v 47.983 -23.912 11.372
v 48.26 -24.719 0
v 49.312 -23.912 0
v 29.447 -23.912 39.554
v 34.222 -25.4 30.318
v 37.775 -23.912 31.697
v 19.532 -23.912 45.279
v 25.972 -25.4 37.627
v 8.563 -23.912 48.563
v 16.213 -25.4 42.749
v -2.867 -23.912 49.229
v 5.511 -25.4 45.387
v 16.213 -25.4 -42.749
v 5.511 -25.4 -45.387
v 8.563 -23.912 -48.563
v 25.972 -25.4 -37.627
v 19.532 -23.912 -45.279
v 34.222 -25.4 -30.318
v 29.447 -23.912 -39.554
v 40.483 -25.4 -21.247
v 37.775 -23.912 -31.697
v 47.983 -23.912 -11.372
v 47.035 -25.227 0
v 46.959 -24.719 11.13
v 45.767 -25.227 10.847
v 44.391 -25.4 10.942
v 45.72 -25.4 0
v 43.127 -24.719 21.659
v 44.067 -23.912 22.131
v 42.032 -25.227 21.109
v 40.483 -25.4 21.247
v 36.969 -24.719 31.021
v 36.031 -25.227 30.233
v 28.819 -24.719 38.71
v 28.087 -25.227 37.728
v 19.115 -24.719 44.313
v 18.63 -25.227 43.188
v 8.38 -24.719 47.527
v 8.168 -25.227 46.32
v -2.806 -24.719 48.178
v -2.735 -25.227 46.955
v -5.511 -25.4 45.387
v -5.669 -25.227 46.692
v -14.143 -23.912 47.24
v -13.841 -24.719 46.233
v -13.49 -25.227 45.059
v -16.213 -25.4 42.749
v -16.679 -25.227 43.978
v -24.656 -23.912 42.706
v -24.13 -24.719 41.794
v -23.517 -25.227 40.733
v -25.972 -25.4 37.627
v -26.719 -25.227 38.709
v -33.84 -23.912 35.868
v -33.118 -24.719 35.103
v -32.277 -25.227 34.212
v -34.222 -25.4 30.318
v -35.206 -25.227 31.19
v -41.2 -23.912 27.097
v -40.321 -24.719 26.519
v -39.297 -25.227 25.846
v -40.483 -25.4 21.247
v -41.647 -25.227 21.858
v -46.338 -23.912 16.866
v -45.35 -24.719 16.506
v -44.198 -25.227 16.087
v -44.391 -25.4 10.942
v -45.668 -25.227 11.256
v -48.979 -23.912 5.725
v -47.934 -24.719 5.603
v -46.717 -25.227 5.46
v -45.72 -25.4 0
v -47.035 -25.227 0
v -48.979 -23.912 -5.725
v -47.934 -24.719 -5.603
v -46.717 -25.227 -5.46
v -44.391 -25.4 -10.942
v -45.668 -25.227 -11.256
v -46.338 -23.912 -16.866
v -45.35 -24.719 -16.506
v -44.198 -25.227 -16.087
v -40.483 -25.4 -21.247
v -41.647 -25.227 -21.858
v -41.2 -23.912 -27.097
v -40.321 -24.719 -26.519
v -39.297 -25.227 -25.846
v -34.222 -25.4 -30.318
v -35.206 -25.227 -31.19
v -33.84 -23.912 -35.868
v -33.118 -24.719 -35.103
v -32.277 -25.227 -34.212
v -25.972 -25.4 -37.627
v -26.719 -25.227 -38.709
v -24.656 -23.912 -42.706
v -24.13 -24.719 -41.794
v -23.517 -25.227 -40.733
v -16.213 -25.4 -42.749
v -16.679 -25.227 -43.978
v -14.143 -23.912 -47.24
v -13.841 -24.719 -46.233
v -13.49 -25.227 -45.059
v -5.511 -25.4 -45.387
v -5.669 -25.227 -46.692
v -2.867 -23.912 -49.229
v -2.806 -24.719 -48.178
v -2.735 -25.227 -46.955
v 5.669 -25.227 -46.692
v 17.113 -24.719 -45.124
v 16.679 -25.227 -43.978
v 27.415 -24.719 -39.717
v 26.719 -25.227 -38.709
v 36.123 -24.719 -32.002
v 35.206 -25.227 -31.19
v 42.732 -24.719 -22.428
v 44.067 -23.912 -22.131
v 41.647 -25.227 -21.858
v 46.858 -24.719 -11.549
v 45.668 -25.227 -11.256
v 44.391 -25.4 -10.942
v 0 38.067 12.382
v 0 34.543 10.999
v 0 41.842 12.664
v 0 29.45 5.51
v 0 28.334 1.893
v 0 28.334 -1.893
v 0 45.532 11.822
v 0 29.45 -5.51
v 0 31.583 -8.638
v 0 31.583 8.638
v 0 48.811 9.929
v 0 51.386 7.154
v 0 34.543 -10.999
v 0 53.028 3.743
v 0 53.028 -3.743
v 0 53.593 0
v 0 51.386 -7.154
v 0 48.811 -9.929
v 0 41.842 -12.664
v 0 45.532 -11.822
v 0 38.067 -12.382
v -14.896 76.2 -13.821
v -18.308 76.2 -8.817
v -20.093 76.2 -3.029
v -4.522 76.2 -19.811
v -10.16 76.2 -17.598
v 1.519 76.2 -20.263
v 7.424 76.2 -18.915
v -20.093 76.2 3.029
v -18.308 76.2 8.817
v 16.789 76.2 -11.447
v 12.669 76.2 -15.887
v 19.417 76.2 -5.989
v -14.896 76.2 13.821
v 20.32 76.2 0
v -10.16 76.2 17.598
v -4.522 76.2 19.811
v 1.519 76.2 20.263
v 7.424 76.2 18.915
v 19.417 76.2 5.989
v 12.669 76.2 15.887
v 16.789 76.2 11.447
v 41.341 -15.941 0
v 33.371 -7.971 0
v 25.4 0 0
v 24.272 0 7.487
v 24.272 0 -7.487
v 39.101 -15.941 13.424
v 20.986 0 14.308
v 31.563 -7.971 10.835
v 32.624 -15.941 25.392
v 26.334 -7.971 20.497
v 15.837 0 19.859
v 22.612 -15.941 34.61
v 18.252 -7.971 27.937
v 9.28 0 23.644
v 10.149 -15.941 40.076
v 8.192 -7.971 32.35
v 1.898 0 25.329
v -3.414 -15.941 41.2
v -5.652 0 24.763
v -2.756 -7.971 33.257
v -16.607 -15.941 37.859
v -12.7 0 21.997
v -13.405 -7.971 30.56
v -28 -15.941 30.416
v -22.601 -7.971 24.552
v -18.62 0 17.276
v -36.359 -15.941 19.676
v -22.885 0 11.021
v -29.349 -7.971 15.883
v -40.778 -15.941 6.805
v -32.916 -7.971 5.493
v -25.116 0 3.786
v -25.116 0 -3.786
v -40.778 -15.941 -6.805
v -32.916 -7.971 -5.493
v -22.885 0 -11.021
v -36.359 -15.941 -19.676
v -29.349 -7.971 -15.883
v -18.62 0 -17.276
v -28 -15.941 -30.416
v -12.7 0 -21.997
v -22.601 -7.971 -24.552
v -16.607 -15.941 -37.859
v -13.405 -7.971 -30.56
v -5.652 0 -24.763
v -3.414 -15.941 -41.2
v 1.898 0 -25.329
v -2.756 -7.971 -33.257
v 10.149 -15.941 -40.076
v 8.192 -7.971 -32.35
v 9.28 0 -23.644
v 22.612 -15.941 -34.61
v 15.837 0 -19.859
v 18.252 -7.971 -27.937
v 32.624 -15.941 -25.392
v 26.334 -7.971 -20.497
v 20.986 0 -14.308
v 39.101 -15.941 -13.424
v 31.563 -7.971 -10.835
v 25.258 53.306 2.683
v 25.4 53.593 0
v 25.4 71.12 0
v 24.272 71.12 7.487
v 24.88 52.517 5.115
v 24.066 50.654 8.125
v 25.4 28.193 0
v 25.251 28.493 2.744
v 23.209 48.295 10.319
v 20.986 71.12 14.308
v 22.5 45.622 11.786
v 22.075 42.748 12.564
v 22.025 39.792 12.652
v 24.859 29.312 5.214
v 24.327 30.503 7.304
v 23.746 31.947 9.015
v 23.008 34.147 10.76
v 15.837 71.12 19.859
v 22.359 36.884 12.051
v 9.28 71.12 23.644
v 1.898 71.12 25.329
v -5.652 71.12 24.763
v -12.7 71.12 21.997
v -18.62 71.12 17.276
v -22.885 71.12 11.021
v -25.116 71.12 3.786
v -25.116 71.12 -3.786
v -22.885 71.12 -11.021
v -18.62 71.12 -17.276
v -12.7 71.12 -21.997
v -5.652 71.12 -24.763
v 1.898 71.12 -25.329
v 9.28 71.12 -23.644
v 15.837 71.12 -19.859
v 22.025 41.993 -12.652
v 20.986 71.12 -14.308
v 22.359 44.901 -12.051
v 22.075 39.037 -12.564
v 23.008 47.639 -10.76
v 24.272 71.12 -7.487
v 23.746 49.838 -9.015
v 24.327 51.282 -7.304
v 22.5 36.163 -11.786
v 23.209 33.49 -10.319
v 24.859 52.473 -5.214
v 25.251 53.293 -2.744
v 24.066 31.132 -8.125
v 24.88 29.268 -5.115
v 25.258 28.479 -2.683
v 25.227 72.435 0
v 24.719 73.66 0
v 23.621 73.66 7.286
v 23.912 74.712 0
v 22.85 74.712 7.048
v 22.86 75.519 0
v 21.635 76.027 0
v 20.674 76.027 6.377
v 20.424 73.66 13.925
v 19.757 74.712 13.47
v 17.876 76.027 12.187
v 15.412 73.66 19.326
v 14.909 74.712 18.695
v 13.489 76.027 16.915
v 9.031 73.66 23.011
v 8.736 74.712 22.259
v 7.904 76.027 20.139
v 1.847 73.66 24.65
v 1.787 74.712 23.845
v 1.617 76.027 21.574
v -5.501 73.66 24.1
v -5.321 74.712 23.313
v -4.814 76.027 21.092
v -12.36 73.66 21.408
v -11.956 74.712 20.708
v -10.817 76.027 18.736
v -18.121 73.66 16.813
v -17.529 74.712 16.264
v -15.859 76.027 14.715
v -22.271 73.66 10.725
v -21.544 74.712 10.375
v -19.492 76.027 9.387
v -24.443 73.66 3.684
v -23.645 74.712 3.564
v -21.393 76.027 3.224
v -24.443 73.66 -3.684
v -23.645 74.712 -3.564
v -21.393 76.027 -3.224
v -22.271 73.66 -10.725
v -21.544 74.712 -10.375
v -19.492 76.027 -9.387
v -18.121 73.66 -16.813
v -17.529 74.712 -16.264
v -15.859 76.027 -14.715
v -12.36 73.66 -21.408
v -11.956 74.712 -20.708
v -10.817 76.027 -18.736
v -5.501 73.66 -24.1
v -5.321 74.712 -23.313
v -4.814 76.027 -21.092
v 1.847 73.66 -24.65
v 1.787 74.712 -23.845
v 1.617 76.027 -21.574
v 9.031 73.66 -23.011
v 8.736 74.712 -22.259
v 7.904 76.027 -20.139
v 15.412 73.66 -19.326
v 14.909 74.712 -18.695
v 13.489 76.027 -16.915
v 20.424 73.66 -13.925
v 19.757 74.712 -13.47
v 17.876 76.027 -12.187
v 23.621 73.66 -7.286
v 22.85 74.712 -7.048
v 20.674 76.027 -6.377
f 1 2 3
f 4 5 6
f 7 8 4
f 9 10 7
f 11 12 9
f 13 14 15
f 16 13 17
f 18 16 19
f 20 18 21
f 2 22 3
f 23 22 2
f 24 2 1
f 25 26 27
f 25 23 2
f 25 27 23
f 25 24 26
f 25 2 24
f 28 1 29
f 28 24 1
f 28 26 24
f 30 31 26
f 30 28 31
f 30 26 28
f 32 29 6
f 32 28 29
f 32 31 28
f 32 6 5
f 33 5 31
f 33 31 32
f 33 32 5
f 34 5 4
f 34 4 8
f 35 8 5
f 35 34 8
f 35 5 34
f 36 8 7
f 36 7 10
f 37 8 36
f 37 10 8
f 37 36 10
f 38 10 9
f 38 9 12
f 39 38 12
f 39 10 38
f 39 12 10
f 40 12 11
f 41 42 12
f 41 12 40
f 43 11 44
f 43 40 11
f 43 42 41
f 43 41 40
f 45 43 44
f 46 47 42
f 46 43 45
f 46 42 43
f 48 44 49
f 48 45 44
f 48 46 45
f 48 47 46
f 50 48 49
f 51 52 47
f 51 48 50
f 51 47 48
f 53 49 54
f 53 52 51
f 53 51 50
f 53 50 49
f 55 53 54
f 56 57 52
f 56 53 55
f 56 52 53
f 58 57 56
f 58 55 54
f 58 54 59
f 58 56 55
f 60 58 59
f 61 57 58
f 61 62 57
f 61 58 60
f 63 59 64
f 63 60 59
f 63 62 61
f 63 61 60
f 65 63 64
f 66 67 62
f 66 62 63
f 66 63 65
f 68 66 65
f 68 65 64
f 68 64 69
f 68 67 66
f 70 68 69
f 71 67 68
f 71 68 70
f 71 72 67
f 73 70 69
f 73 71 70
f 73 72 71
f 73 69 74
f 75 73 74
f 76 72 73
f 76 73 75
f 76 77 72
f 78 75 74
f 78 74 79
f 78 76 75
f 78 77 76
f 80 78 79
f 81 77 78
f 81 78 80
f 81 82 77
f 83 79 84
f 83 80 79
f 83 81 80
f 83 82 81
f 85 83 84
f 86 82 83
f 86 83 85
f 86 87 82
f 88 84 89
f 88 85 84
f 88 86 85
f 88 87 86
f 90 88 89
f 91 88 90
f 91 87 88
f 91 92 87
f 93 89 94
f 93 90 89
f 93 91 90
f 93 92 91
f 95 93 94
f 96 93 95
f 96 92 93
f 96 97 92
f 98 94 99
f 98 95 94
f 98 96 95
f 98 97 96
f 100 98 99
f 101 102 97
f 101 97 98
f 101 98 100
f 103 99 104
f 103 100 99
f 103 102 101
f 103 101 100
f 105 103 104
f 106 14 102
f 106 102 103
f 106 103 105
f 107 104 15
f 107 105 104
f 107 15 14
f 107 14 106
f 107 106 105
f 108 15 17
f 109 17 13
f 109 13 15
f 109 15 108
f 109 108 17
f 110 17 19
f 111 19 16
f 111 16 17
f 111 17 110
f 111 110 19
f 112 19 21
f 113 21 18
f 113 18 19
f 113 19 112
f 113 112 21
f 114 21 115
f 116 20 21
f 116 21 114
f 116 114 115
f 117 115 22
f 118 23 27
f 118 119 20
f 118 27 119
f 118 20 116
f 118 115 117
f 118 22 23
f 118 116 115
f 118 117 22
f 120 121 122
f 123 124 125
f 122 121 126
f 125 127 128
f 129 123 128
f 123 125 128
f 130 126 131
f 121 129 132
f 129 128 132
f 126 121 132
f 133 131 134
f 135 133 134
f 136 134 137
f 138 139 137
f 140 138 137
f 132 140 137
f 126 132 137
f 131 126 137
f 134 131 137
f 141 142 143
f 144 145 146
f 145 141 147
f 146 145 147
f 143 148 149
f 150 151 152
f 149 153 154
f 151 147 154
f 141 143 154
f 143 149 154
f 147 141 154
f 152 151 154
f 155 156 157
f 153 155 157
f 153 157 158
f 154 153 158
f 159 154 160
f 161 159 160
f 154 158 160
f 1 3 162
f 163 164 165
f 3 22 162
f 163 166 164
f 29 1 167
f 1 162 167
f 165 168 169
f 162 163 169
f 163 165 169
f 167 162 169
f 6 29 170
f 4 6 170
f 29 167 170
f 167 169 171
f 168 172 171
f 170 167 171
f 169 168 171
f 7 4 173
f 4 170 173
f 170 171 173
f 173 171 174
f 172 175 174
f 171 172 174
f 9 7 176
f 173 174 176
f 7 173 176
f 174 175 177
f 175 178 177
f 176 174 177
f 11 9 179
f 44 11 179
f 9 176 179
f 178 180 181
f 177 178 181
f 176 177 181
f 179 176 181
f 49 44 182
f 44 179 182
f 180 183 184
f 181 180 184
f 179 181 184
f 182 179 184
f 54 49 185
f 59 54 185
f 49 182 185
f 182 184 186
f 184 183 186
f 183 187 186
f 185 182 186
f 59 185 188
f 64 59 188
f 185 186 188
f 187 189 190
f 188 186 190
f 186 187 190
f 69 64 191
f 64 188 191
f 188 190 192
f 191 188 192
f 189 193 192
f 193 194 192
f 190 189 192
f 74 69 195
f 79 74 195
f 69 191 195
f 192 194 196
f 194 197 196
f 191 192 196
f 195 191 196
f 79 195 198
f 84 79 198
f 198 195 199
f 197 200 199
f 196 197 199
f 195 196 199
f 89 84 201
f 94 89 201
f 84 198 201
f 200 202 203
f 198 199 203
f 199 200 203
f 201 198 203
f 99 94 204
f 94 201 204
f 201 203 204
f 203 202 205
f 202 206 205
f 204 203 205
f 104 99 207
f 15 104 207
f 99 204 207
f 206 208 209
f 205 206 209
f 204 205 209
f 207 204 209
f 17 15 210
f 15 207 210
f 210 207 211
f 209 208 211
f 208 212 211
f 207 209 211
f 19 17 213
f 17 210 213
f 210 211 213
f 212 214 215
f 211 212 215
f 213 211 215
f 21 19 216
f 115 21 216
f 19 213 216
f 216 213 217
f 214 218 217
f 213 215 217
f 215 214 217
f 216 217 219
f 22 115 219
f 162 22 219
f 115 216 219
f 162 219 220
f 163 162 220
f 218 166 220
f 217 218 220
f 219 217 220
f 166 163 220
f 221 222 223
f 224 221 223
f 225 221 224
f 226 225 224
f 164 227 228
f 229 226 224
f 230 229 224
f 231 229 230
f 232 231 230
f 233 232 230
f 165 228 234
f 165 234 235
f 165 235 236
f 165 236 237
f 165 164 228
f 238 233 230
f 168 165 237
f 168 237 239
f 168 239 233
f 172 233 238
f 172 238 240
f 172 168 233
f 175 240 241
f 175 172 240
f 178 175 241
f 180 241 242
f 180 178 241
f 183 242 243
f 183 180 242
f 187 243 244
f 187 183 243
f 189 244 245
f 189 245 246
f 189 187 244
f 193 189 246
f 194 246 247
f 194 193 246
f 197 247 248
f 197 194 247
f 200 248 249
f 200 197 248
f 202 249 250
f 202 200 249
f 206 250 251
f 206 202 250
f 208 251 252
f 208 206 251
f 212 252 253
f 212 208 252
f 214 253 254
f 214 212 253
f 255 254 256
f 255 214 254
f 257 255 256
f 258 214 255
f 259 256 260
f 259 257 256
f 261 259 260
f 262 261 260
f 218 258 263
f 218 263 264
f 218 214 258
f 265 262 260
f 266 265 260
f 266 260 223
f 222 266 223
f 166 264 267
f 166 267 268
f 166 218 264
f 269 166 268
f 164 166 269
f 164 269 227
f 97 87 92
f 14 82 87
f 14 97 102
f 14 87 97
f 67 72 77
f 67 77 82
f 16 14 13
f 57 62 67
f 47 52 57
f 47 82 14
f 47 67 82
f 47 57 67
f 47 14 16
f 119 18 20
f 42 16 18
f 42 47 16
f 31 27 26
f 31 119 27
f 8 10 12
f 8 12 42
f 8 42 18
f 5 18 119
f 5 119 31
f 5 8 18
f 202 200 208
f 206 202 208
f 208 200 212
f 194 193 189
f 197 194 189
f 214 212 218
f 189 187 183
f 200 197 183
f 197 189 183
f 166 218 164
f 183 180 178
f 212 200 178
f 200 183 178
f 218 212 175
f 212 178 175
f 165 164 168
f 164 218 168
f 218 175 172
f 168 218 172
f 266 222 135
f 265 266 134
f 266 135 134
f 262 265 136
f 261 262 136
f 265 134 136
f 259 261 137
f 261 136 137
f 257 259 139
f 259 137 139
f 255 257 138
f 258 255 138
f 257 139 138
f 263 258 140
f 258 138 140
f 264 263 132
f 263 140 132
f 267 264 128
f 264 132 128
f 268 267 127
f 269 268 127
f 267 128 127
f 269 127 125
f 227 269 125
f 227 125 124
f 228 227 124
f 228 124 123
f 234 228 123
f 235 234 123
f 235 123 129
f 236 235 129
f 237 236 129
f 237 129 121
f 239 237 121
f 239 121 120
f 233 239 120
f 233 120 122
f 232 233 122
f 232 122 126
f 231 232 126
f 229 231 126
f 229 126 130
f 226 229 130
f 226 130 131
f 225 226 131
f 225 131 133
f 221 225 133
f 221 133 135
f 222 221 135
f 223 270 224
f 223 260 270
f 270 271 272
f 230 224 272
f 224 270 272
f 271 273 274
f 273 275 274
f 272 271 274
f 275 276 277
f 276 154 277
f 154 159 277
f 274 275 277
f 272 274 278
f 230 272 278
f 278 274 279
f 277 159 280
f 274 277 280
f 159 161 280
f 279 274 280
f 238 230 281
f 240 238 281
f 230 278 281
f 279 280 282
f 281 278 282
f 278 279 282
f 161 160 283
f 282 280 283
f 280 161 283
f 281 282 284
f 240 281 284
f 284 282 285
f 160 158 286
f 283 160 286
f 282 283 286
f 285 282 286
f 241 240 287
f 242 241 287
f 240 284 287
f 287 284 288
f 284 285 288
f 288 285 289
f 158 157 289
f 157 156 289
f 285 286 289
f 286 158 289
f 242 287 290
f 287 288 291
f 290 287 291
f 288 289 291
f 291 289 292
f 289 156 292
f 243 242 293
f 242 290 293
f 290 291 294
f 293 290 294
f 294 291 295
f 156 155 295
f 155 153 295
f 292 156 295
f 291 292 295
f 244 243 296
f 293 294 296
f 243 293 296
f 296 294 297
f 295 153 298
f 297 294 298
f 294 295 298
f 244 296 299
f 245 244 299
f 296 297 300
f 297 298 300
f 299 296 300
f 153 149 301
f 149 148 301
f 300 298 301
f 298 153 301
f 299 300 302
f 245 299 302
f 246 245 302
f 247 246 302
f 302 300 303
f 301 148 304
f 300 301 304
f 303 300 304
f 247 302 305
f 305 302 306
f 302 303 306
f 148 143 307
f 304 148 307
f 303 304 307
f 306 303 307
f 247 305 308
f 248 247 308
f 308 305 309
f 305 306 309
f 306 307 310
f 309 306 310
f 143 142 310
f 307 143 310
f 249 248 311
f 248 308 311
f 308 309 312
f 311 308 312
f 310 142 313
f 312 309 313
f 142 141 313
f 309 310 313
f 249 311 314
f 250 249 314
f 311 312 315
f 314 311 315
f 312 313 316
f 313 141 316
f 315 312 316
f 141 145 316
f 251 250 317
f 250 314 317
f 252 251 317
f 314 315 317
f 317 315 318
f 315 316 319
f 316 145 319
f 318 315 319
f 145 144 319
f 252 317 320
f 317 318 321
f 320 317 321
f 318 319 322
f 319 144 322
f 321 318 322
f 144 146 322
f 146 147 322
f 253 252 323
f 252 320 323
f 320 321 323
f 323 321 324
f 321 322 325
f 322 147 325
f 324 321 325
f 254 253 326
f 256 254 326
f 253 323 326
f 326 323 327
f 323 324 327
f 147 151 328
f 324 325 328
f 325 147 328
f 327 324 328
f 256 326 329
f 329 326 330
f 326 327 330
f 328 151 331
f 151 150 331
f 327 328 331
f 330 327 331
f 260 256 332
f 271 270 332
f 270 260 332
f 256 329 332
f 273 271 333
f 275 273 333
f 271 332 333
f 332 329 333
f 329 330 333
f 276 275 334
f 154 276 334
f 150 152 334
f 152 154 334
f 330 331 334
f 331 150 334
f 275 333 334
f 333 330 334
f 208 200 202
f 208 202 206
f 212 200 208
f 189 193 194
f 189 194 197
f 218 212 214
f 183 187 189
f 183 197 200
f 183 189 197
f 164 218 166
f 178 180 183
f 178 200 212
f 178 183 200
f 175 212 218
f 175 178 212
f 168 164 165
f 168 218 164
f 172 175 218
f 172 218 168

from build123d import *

# Parameters (mm, degrees)
F0_R     = 50.8
F1_DEPTH = 25.4
F2_R     = 5.08
F4_DEPTH = 76.2
F5_R     = 5.08
F7_D     = 25.4
F7_DEPTH = 25.401


# Not quite as in the source:
# - a fillet or chamfer that OpenCascade refuses, or shapes differently, is made with other operations: its cross-section is extruded or revolved along the edge and cut away or added


with BuildPart() as f1:
    # F0 (on Front) → F1 (new body)
    with BuildSketch(Plane.XZ):
        Circle(F0_R)
    extrude(amount=F1_DEPTH)

    # F2
    f2_edges = [f1.edges().sort_by_distance(p)[0] for p in [
        (-50.8, -25.4, 0),
    ]]
    fillet(f2_edges, radius=F2_R)

    # F3: chamfer of 25.4 on 1 edges, made by hand

    # F3_s1 → F3_t2 (revolve, cut)
    with BuildSketch(Plane.XY):
        Polygon((50.8, -25.4), (25.4, 0), (50.8, 0), align=None)
    revolve(axis=Axis((0, 0, 0), (0, -1, 0)), mode=Mode.SUBTRACT)


with BuildPart() as f4:
    # F4 (new): a face of the model
    f4_faces = [f1.part.faces().sort_by_distance(p)[0] for p in [
        (0, 0, 0),
    ]]
    extrude(f4_faces, amount=F4_DEPTH)

    # F5
    f5_edges = [f4.edges().sort_by_distance(p)[0] for p in [
        (-25.4, 76.2, 0),
    ]]
    fillet(f5_edges, radius=F5_R)

    # F7 (through all, one way)
    with BuildSketch(Plane(origin=(0, 0, 0), x_dir=(0, 1, 0), z_dir=(-1, 0, 0))):
        with Locations((40.8925935626, 0)):
            Circle(F7_D / 2)
    extrude(amount=-F7_DEPTH, mode=Mode.SUBTRACT)


solid = Compound([f1.part, f4.part])
